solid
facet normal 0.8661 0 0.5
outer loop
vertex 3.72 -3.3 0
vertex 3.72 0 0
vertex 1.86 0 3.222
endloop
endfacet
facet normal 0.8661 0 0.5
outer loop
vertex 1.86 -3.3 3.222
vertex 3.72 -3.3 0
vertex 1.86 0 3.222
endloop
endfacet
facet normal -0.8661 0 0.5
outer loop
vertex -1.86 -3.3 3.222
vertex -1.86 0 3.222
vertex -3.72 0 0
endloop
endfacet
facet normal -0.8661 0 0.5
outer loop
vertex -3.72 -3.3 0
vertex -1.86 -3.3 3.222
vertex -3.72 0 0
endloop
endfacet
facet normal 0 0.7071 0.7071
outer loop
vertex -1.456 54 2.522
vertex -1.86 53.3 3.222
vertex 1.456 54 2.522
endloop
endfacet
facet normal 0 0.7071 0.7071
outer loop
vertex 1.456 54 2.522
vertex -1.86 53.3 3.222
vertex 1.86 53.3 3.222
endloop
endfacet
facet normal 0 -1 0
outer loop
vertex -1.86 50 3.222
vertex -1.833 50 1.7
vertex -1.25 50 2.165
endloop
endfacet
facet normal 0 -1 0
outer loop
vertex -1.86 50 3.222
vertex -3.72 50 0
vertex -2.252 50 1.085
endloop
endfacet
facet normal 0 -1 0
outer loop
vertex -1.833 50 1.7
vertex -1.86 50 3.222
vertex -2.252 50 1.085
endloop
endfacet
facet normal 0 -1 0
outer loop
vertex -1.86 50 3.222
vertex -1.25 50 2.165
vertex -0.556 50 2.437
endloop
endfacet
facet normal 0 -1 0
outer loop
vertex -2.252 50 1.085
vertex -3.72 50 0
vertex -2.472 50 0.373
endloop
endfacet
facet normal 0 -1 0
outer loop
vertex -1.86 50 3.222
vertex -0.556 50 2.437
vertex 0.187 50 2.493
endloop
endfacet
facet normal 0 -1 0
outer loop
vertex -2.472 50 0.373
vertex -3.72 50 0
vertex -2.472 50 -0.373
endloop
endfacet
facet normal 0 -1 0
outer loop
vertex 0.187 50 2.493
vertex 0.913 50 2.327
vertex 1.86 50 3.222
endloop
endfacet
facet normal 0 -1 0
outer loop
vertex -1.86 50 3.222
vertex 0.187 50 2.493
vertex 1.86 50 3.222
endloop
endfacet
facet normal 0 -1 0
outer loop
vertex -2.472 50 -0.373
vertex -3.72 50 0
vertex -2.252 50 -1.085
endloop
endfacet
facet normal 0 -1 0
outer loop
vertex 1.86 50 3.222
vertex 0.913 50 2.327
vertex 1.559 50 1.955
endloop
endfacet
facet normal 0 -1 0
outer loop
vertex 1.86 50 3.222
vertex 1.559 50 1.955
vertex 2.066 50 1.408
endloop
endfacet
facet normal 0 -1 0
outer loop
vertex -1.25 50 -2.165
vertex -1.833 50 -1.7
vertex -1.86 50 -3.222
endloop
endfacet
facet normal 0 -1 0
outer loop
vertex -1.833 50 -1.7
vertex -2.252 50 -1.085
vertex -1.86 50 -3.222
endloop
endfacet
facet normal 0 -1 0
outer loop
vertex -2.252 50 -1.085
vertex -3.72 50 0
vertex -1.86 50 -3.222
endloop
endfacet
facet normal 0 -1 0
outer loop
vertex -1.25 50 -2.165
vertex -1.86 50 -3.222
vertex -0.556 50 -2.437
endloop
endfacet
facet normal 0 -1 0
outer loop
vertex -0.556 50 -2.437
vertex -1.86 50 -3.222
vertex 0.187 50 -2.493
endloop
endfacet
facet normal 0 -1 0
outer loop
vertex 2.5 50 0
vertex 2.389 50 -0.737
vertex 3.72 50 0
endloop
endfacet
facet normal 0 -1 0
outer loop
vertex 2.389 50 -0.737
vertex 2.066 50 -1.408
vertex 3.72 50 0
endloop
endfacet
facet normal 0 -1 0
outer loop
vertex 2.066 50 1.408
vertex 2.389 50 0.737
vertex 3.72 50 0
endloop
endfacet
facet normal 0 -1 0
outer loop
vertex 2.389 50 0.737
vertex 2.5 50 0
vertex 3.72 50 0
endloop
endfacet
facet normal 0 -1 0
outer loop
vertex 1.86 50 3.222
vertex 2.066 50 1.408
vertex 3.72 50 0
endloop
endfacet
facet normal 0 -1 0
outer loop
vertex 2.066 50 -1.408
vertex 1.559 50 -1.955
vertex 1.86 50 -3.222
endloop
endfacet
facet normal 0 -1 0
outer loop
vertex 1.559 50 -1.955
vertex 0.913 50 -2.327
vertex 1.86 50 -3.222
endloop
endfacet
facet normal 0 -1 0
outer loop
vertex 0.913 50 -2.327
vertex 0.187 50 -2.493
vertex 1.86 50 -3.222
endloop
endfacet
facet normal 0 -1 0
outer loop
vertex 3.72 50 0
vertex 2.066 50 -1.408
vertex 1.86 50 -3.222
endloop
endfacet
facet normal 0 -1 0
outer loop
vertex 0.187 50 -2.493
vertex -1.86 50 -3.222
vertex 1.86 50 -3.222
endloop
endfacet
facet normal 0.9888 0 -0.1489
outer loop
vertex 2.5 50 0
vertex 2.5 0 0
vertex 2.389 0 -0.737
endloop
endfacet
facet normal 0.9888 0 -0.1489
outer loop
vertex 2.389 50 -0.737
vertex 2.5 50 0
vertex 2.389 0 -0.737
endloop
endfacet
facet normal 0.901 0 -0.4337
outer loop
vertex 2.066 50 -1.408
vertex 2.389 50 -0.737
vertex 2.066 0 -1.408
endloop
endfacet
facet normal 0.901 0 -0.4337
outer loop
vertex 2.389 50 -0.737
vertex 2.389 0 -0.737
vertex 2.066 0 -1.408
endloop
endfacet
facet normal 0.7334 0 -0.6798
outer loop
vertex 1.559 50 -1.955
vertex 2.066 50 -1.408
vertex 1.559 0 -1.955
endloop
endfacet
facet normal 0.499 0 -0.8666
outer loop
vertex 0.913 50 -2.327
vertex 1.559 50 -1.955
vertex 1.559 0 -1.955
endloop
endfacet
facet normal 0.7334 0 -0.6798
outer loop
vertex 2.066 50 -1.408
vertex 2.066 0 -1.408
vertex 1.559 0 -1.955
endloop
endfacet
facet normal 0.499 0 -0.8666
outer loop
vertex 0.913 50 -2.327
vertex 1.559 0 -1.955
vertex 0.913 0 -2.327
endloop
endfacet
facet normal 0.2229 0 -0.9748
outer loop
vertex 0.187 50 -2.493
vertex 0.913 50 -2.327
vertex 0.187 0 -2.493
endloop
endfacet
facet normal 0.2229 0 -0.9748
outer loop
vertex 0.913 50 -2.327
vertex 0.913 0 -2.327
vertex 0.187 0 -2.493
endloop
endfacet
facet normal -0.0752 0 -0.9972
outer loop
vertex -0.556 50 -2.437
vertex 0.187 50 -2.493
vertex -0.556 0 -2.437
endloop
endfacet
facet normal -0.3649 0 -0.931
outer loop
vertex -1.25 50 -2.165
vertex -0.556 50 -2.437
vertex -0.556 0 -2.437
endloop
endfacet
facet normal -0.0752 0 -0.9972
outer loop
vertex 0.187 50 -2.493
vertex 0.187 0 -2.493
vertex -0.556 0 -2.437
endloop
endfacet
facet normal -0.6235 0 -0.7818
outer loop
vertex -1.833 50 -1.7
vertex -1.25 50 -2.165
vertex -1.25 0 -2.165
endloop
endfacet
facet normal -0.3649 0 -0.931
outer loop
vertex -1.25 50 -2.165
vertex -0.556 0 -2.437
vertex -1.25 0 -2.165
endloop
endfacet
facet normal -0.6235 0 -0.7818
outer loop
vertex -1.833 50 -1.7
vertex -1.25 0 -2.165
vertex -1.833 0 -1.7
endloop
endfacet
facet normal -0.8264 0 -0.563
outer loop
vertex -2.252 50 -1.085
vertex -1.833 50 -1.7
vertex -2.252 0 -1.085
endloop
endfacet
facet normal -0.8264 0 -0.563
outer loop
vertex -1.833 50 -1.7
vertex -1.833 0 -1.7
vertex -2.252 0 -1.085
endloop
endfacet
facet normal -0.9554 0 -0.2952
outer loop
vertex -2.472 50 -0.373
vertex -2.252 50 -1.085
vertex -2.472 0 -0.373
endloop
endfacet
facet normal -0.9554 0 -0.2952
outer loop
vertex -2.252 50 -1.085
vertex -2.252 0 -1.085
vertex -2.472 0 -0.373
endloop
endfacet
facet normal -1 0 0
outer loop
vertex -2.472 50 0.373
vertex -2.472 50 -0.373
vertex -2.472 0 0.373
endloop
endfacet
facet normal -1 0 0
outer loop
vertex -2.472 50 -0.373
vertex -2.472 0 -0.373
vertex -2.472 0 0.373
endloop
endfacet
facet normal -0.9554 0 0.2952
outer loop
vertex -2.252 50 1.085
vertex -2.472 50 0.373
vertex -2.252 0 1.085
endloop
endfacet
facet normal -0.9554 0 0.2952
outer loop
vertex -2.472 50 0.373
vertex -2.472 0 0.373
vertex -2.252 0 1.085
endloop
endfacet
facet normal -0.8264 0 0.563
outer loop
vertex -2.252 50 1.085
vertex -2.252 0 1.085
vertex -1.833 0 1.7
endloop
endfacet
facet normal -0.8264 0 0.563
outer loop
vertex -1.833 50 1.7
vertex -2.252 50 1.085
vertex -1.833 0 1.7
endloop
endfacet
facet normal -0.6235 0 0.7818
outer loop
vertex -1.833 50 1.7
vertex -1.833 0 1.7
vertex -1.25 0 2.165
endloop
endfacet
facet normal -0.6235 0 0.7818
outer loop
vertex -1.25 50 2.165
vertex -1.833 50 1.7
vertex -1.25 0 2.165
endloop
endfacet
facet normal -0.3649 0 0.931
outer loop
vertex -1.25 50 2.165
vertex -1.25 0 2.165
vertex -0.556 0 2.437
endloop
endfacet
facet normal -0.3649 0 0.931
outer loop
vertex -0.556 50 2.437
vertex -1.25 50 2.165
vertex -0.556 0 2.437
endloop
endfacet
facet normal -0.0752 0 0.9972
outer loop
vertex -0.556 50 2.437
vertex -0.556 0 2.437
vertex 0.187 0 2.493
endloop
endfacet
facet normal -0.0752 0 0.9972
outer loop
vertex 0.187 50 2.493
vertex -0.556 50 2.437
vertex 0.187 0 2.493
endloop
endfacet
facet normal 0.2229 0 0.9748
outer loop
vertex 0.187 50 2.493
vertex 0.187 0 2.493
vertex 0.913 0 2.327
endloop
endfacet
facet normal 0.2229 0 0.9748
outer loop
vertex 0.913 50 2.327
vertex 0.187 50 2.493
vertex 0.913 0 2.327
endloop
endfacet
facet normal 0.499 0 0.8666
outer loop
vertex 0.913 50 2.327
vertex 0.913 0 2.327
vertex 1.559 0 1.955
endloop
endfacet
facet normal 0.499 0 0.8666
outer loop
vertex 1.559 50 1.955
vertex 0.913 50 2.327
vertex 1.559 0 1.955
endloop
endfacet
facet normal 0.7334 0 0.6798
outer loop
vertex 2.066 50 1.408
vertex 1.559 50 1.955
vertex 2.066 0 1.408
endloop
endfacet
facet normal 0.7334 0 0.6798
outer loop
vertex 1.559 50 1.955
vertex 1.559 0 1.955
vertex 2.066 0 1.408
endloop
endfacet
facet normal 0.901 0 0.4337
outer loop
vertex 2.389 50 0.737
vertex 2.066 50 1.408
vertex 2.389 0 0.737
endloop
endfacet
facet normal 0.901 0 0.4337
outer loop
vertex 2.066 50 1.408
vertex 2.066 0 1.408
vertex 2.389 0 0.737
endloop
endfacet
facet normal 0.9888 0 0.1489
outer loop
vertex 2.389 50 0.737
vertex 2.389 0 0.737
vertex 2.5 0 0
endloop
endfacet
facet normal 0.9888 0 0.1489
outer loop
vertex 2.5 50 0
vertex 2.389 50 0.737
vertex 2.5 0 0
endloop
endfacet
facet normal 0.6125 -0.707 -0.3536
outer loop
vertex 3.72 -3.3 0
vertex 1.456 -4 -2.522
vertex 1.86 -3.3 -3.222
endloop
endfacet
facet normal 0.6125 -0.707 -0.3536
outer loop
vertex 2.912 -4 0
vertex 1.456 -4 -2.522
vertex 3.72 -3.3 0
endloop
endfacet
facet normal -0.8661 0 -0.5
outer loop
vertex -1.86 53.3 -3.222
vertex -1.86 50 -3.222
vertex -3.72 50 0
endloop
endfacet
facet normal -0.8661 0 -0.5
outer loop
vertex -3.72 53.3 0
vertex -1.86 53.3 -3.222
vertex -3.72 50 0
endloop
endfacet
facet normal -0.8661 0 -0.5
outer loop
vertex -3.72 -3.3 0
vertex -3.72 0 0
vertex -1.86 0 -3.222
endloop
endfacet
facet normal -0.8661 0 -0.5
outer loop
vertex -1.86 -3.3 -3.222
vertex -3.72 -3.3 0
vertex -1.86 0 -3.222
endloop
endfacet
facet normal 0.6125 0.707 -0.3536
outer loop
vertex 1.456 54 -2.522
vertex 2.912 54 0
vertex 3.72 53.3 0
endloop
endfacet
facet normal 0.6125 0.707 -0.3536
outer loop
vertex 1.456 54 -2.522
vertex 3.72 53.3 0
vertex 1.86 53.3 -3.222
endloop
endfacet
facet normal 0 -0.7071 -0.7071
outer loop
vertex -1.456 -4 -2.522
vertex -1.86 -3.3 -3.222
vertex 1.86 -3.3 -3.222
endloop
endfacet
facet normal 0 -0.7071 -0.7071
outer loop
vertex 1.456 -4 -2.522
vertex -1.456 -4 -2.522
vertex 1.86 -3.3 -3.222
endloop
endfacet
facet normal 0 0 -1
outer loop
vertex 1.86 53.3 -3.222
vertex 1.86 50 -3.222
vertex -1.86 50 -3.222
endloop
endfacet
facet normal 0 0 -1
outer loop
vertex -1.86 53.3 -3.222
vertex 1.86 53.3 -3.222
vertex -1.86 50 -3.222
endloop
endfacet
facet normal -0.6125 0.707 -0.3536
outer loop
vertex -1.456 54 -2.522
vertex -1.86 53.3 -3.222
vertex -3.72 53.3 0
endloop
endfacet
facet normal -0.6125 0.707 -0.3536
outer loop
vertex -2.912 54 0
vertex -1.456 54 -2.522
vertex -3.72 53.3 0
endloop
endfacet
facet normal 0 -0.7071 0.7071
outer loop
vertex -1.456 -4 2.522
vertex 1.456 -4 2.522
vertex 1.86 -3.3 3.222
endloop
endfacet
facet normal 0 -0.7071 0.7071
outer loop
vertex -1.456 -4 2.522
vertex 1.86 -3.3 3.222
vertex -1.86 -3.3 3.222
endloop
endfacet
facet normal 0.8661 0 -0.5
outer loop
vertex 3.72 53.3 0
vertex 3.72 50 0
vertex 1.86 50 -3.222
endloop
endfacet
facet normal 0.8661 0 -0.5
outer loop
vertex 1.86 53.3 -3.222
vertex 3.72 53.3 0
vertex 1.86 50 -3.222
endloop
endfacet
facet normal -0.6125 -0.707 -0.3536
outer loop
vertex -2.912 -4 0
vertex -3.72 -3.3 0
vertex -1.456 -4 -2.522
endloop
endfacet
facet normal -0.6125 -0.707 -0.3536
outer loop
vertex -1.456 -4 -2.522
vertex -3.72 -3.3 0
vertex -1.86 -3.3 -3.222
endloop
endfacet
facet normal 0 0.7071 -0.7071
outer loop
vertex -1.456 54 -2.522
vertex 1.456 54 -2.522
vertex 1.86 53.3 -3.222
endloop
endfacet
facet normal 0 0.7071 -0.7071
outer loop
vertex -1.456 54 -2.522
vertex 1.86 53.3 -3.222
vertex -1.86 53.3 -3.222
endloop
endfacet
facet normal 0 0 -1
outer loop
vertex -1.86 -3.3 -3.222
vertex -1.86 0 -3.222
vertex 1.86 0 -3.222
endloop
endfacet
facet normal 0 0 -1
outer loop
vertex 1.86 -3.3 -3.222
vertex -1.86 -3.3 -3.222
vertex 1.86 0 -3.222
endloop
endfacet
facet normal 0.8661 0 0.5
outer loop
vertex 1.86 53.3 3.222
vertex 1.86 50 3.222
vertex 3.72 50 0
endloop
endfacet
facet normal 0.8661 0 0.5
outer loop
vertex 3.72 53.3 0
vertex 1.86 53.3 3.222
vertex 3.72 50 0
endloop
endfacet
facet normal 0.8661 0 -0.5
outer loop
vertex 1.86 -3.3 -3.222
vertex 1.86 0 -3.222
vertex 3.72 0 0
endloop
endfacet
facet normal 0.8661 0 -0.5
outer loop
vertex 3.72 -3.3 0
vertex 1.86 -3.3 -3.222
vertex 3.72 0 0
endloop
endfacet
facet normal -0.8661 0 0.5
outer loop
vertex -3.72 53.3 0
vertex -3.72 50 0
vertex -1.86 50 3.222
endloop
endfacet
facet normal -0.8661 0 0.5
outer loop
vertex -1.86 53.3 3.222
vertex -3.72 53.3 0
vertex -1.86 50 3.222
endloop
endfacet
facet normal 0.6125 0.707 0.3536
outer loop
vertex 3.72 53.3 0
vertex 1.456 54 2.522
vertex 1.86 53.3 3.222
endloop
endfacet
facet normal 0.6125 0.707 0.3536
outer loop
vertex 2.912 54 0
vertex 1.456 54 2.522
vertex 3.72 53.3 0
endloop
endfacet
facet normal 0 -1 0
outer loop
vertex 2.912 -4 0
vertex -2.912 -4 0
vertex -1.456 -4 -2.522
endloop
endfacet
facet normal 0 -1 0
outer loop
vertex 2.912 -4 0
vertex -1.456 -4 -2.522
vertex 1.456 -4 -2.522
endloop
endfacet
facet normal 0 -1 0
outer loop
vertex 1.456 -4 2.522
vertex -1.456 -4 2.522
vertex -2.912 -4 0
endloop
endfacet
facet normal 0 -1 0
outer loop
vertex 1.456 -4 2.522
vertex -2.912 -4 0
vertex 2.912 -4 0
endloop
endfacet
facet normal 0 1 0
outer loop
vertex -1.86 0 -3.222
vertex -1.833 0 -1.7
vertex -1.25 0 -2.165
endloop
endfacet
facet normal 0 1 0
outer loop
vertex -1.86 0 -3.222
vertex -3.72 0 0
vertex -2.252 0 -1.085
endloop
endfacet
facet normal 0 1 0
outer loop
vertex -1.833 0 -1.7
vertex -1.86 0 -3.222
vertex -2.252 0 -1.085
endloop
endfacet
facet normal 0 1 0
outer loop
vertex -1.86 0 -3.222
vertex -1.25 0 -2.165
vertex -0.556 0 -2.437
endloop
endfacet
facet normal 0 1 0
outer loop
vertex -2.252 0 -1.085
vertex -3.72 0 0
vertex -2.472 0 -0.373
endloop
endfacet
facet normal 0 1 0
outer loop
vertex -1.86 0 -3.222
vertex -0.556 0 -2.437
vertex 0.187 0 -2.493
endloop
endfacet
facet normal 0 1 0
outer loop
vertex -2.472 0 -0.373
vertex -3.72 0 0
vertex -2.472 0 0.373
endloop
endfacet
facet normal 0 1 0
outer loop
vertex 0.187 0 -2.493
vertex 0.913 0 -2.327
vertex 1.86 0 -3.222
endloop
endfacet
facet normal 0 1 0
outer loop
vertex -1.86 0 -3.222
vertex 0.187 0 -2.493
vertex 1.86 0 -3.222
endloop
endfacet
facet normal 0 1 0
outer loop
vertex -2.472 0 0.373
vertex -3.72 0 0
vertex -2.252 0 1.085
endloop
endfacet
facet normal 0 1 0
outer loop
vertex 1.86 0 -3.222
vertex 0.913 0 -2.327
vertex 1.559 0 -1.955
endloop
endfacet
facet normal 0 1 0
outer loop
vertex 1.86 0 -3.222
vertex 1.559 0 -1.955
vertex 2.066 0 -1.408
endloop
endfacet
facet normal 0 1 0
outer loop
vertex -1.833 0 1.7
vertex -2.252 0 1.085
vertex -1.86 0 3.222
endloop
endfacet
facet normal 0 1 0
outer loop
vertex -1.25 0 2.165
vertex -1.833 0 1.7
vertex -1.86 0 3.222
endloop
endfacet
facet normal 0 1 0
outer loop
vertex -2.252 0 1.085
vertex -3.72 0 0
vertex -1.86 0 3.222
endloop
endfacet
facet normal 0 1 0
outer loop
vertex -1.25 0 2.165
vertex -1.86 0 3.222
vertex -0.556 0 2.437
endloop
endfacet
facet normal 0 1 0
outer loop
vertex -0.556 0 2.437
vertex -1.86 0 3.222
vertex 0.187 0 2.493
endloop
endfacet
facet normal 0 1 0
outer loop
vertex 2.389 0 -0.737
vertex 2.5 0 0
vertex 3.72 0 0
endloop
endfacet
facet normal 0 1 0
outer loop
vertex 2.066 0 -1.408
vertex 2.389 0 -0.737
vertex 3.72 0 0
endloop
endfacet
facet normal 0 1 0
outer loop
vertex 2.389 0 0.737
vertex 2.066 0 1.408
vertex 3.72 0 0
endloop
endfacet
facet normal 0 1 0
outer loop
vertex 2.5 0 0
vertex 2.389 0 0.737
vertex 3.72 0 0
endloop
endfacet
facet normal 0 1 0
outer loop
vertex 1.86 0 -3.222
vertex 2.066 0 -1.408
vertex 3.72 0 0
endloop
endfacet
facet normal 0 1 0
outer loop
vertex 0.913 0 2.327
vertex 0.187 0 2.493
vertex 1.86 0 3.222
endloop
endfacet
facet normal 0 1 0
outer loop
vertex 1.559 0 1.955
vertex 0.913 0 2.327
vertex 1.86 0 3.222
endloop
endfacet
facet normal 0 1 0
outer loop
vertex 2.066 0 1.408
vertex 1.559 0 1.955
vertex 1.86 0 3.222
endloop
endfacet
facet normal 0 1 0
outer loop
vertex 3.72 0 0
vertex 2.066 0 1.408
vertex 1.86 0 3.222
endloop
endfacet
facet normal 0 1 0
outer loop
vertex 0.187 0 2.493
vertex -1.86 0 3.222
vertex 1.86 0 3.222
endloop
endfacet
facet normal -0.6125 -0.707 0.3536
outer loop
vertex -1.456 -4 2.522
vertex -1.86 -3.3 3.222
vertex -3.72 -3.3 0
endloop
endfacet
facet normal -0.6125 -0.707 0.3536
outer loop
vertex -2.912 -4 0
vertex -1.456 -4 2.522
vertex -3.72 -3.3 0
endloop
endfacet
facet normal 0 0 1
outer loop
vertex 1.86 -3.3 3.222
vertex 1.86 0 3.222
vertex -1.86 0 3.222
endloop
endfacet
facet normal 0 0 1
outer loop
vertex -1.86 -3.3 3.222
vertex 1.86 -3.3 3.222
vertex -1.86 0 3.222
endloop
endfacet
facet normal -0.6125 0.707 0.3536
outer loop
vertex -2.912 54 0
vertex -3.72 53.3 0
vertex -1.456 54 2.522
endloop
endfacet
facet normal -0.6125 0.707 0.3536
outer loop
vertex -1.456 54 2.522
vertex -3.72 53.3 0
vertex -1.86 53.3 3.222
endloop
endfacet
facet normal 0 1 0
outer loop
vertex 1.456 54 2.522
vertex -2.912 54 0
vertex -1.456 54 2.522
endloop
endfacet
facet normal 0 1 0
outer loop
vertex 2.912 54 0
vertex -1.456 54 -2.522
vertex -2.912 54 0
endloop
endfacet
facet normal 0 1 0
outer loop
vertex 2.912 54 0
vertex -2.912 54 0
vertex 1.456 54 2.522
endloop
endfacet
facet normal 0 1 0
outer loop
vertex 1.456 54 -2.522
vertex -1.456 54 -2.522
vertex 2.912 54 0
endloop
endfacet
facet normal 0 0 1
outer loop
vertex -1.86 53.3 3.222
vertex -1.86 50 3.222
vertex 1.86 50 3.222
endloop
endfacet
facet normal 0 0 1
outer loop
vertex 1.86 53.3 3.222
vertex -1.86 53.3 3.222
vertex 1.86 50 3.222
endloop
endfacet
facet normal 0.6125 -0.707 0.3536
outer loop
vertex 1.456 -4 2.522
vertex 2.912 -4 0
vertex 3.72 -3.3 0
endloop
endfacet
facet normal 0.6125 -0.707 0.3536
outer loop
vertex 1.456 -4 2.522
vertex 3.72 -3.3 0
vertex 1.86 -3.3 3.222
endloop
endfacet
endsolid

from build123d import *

# Parameters (mm, degrees)
SKETCH1_R           = 2.5
BOSS_EXTRUDE1_DEPTH = 50
BOSS_EXTRUDE2_DEPTH = 4
CHAMFER1_SIZE       = 0.7
BOSS_EXTRUDE3_DEPTH = 4
CHAMFER2_SIZE       = 0.7


with BuildPart() as part:
    # Sketch1 → Boss-Extrude1 (new body)
    with BuildSketch(Plane(origin=(0, 0, 0), x_dir=(1, 0, 0), z_dir=(0, 1, 0))):
        Circle(SKETCH1_R)
    extrude(amount=BOSS_EXTRUDE1_DEPTH)

    # Sketch2 → Boss-Extrude2 (add)
    with BuildSketch(Plane(origin=(0, 50, 0), x_dir=(1, 0, 0), z_dir=(0, 1, 0))):
        Polygon((3.720037117, 0), (1.860018559, 3.221646647), (-1.860018559, 3.221646647), (-3.720037117, 0), (-1.860018559, -3.221646647), (1.860018559, -3.221646647), align=None)
    extrude(amount=BOSS_EXTRUDE2_DEPTH)

    # Chamfer1
    chamfer1_edges = [part.edges().sort_by_distance(p)[0] for p in [
        (2.790027838, 54, 1.610823323),
        (2.790027838, 54, -1.610823323),
        (0, 54, -3.221646647),
        (-2.790027838, 54, -1.610823323),
        (-2.790027838, 54, 1.610823323),
        (0, 54, 3.221646647),
    ]]
    chamfer(chamfer1_edges, length=CHAMFER1_SIZE)

    # Sketch3 → Boss-Extrude3 (add)
    with BuildSketch(Plane.XZ):
        Polygon((3.720037117, 0), (1.860018559, 3.221646647), (-1.860018559, 3.221646647), (-3.720037117, 0), (-1.860018559, -3.221646647), (1.860018559, -3.221646647), align=None)
    extrude(amount=BOSS_EXTRUDE3_DEPTH)

    # Chamfer2
    chamfer2_edges = [part.edges().sort_by_distance(p)[0] for p in [
        (2.790027838, -4, -1.610823323),
        (2.790027838, -4, 1.610823323),
        (0, -4, 3.221646647),
        (-2.790027838, -4, 1.610823323),
        (-2.790027838, -4, -1.610823323),
        (0, -4, -3.221646647),
    ]]
    chamfer(chamfer2_edges, length=CHAMFER2_SIZE)


solid = part.part
